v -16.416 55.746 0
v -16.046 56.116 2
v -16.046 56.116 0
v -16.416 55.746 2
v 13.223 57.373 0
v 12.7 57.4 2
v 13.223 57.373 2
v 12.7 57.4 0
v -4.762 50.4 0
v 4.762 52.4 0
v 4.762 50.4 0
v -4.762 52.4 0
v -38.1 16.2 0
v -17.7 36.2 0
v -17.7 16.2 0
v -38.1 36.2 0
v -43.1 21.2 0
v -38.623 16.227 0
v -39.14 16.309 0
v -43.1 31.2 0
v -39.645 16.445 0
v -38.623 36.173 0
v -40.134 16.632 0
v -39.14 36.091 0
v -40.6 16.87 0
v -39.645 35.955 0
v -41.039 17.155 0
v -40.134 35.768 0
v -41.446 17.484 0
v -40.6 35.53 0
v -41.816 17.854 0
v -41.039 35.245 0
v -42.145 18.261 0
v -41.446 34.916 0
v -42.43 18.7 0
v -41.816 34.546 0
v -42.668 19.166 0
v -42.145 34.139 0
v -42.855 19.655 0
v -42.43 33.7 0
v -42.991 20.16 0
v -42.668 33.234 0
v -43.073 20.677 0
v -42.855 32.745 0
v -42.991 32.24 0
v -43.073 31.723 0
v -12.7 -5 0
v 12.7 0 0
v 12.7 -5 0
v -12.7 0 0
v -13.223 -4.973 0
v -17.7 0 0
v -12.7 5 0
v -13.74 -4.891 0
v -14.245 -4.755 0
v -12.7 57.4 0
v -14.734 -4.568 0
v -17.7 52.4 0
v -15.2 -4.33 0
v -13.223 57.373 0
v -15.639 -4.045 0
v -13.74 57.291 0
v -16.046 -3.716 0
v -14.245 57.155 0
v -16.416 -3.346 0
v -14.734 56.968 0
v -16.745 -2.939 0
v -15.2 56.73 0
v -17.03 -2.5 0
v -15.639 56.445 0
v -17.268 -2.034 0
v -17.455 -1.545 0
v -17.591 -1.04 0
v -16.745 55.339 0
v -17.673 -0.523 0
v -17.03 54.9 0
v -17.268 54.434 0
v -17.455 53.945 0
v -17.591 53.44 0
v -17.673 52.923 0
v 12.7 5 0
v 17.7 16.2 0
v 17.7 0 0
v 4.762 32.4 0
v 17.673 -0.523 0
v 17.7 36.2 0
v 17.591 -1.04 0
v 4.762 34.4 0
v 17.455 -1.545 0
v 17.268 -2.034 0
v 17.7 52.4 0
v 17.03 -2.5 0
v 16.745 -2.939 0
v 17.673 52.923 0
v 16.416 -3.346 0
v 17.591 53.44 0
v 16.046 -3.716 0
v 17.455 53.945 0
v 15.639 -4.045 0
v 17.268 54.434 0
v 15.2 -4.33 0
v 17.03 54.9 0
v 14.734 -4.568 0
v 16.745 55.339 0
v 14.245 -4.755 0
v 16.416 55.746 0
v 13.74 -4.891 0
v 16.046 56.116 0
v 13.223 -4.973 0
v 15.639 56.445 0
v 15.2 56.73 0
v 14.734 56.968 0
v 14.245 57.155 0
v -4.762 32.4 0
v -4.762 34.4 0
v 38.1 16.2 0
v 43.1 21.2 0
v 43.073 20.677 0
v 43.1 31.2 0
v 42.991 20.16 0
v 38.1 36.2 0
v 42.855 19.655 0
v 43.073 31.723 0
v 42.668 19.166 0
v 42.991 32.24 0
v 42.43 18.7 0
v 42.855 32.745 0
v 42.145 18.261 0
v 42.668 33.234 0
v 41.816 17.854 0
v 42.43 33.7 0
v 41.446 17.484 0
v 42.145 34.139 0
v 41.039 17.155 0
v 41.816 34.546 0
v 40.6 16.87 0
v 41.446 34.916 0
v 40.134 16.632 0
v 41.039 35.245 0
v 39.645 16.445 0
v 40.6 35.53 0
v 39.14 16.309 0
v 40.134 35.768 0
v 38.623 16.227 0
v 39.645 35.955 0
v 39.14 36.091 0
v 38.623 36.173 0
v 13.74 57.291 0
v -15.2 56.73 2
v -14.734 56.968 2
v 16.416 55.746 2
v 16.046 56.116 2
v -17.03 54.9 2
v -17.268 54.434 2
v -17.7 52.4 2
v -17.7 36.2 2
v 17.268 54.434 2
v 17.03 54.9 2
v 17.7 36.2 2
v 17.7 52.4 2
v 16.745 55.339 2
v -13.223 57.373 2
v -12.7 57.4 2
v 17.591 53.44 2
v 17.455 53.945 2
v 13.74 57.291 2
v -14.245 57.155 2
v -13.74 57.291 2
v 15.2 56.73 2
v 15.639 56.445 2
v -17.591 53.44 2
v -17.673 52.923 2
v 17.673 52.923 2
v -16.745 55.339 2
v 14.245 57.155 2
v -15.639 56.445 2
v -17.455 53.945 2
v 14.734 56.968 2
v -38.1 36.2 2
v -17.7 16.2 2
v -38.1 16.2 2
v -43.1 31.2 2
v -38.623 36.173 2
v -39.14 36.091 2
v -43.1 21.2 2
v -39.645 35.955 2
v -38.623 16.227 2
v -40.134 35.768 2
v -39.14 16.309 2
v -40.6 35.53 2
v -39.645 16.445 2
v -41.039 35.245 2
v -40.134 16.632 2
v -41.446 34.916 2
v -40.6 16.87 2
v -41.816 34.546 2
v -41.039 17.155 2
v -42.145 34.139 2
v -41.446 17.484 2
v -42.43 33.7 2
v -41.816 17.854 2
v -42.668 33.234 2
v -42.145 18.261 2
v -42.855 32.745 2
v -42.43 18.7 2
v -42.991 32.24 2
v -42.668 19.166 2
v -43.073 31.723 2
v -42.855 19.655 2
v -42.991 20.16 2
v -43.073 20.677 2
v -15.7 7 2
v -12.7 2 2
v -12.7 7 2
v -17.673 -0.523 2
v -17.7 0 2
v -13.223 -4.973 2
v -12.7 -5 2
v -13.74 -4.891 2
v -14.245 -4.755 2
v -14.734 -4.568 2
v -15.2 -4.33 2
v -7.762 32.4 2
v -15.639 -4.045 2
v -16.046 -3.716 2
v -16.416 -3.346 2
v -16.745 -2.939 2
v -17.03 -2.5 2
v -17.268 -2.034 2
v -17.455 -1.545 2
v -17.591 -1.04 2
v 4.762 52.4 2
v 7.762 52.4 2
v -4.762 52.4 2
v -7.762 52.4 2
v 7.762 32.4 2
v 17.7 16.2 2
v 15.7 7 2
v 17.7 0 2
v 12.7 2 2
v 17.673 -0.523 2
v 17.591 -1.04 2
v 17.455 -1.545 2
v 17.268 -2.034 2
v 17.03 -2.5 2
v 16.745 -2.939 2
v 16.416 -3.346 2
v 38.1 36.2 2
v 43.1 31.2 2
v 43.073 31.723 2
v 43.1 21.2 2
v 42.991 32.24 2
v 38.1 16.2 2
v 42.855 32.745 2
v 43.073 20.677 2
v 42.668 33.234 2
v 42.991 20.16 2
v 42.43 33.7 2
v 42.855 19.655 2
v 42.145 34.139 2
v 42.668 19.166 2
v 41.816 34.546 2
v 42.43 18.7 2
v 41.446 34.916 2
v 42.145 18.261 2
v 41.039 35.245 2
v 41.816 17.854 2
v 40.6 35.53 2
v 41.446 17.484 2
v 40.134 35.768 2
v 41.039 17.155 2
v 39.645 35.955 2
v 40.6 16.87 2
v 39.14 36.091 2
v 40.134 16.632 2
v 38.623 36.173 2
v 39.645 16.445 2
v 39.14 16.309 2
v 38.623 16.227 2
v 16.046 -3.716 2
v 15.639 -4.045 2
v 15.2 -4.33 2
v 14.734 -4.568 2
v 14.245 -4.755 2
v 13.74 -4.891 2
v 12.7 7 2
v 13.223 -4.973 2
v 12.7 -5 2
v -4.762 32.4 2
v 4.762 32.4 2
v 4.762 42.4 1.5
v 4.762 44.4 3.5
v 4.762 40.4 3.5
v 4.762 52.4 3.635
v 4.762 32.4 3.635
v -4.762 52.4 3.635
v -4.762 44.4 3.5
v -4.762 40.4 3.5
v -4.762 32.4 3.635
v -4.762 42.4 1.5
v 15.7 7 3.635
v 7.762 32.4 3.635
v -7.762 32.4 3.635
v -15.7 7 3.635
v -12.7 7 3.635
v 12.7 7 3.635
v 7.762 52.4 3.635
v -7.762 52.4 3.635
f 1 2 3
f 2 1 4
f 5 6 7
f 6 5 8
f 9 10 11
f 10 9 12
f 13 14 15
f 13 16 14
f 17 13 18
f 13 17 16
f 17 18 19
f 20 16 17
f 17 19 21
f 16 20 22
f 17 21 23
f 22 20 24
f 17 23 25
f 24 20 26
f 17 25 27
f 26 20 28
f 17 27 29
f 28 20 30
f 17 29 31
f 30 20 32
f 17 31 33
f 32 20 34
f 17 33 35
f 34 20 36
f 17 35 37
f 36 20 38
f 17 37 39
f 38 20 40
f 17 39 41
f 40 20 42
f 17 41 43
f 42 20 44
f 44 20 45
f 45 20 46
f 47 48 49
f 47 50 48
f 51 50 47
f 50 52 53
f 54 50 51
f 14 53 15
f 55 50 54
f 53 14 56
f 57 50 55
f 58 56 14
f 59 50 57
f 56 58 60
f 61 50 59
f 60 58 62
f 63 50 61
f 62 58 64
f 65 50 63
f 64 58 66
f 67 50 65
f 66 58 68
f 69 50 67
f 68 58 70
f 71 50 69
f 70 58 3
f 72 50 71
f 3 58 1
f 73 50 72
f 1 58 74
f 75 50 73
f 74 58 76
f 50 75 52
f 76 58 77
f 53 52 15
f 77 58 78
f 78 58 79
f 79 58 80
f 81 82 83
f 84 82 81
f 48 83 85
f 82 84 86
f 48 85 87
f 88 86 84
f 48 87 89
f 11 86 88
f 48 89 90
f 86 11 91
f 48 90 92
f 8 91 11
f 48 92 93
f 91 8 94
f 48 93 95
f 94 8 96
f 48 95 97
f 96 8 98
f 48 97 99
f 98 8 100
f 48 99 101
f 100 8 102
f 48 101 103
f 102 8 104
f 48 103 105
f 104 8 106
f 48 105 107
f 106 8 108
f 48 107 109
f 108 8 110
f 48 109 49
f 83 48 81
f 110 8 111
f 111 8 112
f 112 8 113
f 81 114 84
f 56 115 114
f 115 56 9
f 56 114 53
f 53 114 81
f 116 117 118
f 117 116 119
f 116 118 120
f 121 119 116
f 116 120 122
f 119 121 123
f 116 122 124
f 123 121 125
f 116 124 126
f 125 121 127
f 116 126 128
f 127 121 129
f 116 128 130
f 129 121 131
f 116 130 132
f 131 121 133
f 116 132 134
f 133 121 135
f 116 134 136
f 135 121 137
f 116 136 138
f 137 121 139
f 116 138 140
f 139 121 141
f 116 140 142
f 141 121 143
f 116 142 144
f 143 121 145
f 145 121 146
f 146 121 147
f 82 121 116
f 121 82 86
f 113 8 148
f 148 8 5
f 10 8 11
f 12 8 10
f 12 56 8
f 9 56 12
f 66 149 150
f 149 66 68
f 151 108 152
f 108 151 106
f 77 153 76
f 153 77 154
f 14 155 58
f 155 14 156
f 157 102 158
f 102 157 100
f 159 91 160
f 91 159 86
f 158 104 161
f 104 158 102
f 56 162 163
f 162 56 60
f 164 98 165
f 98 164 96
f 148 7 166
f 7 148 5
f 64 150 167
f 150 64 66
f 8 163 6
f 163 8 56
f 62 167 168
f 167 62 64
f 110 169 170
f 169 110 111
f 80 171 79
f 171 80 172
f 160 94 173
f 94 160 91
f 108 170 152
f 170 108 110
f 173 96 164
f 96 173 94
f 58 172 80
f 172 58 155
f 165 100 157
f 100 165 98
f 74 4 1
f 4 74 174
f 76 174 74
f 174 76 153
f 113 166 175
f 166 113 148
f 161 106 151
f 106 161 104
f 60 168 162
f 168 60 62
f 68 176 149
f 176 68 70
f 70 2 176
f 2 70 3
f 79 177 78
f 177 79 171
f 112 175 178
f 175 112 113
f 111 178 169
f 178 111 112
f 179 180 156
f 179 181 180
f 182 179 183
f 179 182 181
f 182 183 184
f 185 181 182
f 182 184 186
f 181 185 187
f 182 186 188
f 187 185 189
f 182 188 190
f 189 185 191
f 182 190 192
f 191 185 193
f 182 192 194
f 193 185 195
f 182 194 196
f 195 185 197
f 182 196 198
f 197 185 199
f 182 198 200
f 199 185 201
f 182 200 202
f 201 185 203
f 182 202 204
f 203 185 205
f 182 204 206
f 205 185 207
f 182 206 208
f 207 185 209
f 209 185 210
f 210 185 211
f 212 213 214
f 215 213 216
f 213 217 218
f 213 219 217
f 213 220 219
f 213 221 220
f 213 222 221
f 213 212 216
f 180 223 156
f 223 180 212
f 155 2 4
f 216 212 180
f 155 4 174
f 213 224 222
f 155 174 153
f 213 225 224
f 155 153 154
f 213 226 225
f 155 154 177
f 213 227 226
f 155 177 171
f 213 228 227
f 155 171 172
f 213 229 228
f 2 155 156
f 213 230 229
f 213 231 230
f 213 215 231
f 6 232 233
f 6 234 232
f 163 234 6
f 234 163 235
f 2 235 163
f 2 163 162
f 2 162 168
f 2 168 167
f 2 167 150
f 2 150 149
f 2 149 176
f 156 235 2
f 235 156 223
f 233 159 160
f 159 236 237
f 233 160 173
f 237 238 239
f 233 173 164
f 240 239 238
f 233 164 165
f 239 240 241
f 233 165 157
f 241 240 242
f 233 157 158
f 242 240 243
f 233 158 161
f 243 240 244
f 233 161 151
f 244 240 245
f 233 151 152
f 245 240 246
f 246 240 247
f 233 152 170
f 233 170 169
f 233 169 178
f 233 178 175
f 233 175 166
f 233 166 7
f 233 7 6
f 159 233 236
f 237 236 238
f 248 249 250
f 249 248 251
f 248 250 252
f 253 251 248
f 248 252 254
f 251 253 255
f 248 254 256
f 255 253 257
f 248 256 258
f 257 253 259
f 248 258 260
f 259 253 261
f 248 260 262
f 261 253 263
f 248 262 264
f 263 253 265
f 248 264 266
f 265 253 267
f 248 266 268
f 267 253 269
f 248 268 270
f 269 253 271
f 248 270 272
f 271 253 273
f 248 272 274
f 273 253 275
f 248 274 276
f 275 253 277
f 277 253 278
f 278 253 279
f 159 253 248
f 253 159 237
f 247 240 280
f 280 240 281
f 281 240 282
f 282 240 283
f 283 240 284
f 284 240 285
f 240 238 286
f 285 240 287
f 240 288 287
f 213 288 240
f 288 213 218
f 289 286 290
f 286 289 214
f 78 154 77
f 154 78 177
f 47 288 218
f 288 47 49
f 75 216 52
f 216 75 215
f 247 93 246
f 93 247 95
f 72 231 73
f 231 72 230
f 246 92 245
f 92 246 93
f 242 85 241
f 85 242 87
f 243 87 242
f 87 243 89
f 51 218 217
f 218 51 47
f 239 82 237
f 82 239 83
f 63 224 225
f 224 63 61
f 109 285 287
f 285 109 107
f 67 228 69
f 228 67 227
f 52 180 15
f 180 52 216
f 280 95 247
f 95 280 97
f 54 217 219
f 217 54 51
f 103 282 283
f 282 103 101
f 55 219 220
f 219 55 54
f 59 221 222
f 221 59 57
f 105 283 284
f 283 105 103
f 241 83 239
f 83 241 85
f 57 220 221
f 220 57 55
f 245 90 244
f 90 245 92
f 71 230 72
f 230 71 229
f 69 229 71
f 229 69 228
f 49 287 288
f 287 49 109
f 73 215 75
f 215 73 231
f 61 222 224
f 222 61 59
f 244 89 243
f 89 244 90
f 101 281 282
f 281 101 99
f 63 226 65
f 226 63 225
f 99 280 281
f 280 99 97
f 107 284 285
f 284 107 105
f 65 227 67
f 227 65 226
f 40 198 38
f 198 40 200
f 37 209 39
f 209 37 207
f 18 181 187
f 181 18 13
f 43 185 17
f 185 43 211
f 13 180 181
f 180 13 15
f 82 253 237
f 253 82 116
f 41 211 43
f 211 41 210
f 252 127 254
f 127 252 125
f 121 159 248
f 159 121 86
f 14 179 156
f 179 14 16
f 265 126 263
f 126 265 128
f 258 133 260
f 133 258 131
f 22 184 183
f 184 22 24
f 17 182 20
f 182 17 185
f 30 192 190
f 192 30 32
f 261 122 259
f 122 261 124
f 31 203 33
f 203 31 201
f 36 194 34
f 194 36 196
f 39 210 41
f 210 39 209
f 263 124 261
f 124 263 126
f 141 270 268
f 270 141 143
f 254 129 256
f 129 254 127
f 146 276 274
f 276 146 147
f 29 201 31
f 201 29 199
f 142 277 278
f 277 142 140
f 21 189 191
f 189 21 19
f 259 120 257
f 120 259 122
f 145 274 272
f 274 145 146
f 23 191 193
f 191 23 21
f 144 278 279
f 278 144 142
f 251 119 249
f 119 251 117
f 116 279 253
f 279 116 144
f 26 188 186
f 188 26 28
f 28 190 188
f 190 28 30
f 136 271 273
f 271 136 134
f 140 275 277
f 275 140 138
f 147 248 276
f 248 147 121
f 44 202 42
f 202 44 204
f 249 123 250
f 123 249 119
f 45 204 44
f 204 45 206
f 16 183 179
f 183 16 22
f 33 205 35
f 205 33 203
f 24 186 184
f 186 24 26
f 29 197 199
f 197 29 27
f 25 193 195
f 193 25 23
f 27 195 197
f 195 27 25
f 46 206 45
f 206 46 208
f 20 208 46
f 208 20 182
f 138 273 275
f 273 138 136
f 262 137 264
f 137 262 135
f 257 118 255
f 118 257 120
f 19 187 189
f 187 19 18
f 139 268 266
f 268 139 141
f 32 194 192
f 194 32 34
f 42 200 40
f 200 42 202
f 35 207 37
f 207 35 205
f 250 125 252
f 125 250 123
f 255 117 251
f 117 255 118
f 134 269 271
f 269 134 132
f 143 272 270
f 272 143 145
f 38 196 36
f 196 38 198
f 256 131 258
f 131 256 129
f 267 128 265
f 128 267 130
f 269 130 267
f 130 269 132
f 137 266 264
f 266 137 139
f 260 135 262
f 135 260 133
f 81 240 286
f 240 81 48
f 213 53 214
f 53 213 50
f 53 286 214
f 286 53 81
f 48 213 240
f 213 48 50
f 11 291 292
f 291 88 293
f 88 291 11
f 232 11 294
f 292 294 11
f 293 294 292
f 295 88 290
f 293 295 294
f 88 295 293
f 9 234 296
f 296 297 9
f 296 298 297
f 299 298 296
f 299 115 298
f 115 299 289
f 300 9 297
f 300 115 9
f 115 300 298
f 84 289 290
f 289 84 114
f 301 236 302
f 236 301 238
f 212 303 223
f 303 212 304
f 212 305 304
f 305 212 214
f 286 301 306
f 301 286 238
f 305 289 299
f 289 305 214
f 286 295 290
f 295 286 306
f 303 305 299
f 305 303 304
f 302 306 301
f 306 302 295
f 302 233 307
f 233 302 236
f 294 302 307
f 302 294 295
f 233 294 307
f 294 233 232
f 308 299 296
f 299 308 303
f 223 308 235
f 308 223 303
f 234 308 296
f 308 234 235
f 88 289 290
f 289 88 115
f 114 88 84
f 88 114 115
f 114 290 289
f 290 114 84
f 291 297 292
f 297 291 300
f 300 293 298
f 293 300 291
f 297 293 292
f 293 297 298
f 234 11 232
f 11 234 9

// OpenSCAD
/**
Bias tape maker.  Reverse engineered from design by SamHillCreations
at https://www.thingiverse.com/thing:3034992 - it's a clever design.
Very slim; I like it.

Make sure to run get_deps.sh, or manually download the git repos listed
therein, and copy them into "deps.link/".

Provided any 2 of the following 3 inputs, a bias tape maker is made.
INPUT - width of the input cloth
OUTPUT - width of the output tape
OVERLAP_RATIO - what ratio of the output width is taken up by the
  two sides folded over *each other*.  E.g., 0 if the two sides just
  barely touch, 1 if the entire thing is folded in thirds, and anywhere
  in between is somewhere in between.

The following three are equivalent:

biasTapeMaker(INPUT=undef,OUTPUT=0.642857*INCH,OVERLAP_RATIO=1/3);
biasTapeMaker(INPUT=1.5*INCH,OUTPUT=undef,OVERLAP_RATIO=1/3);
biasTapeMaker(INPUT=1.5*INCH,OUTPUT=0.642857*INCH,OVERLAP_RATIO=undef);

You can also add tabs, via the TAB_LENGTH (and optional TAB_WIDTH) params.
(Note that they are not exact - BORDER (5) is added around them.)
*/

use <deps.link/erhannisScad/misc.scad>
use <deps.link/scadFluidics/common.scad>

$fn=60;
BIG = 1000;
EPS = 1e-40;

INCH = 25.4;

/**
See file header.
*/
module biasTapeMaker(INPUT=undef, OUTPUT=0.645*INCH, OVERLAP_RATIO = 1/3, TAB_LENGTH=0, TAB_WIDTH=10) {
  if (INPUT == undef) {
    FOLD_F = (OVERLAP_RATIO/2+0.5)*OUTPUT;
    INPUT0 = OUTPUT+FOLD_F*2;
    biasTapeMaker(INPUT=INPUT0,OUTPUT=OUTPUT,OVERLAP_RATIO=OVERLAP_RATIO,TAB_LENGTH=TAB_LENGTH,TAB_WIDTH=TAB_WIDTH);
  } else if (OUTPUT == undef) {
    OUTPUT0 = INPUT/(OVERLAP_RATIO+2);
    biasTapeMaker(INPUT=INPUT,OUTPUT=OUTPUT0,OVERLAP_RATIO=OVERLAP_RATIO,TAB_LENGTH=TAB_LENGTH,TAB_WIDTH=TAB_WIDTH);
  } else {
    echo(INPUT=INPUT/INCH);
    echo(OVERLAP_RATIO=(INPUT/OUTPUT-2));
    echo(OUTPUT=OUTPUT/INCH);

    BH = 2;

    INPUT_SLOT_L = 5;
    INPUT_RAMP_EXTRA_L = BH;
    FUNNEL_L = INPUT;
    FOLD_SECTION_L = 20;
    
    FOLDING_BAR_DZ = 1.5;

    BL = INPUT_RAMP_EXTRA_L+INPUT_SLOT_L+FUNNEL_L+FOLD_SECTION_L;
    BW = INPUT;

    WALL_H = BH/2 + INPUT*0.025;
    WALL_T = 3;

    BORDER = 5;

    union() {
      difference() {
        // Body
        translate([0,BL/2,0]) minkowski() {
          translate([0,0,BH/2]) union() {
            cube([BW,BL,BH],center=true);
            cube([BW+TAB_LENGTH*2,TAB_WIDTH,BH],center=true);
          }
          cylinder(d=BORDER*2,h=EPS);
        }
        // Input slot
        skew([0,0,0,45,0,0]) translate([0,INPUT_SLOT_L/2,0]) cube([INPUT,INPUT_SLOT_L,BIG],center=true);
        // Folding section void
        translate([0,INPUT_SLOT_L+INPUT_RAMP_EXTRA_L+FUNNEL_L,0]) translate([0,FOLD_SECTION_L/2,0]) cube([OUTPUT,FOLD_SECTION_L,BIG],center=true);
      }
      // Funnel
      translate([0,INPUT_SLOT_L+INPUT_RAMP_EXTRA_L,0]) difference() {
        minkowski() {
          rotate([-90,0,0]) linear_extrude(height=FUNNEL_L,scale=OUTPUT/INPUT) {
            square([INPUT,BIG/(OUTPUT/INPUT)],center=true);
          }
          cube([WALL_T*2,EPS,EPS],center=true);
        }
        rotate([-90,0,0]) linear_extrude(height=FUNNEL_L,scale=OUTPUT/INPUT) {
          square([INPUT,BIG/(OUTPUT/INPUT)],center=true);
        }
        OZm();
        OZp([0,0,BH+WALL_H]);
      }
      // Output walls
      cmirror([1,0,0]) translate([OUTPUT/2+WALL_T/2,INPUT_SLOT_L+INPUT_RAMP_EXTRA_L+FUNNEL_L,0]) translate([-WALL_T/2,0,0]) cube([WALL_T,FOLD_SECTION_L,BH+WALL_H]);
      // Folding ramp
      translate([0,INPUT_SLOT_L+INPUT_RAMP_EXTRA_L+FUNNEL_L,0]) difference() {
        rotate([45,0,0]) cube([OUTPUT,BH*sqrt(2),BH*sqrt(2)],center=true);
        OZm();
        OYm();
      }
      // Folding bar
      translate([0,INPUT_SLOT_L+INPUT_RAMP_EXTRA_L+FUNNEL_L+FOLD_SECTION_L/2,FOLDING_BAR_DZ]) translate([0,0,BH]) difference() {
        rotate([45,0,0]) cube([OUTPUT,BH*sqrt(2),BH*sqrt(2)],center=true);
        OZp();
      }
      // Output ramp
      translate([0,INPUT_SLOT_L+INPUT_RAMP_EXTRA_L+FUNNEL_L+FOLD_SECTION_L,0]) difference() {
        rotate([45,0,0]) cube([OUTPUT,BH*sqrt(2),BH*sqrt(2)],center=true);
        OZm();
        OYp();
      }
    }
  }
}

biasTapeMaker(INPUT=1*INCH,OUTPUT=3/8*INCH,OVERLAP_RATIO=undef,TAB_LENGTH=1*INCH);
